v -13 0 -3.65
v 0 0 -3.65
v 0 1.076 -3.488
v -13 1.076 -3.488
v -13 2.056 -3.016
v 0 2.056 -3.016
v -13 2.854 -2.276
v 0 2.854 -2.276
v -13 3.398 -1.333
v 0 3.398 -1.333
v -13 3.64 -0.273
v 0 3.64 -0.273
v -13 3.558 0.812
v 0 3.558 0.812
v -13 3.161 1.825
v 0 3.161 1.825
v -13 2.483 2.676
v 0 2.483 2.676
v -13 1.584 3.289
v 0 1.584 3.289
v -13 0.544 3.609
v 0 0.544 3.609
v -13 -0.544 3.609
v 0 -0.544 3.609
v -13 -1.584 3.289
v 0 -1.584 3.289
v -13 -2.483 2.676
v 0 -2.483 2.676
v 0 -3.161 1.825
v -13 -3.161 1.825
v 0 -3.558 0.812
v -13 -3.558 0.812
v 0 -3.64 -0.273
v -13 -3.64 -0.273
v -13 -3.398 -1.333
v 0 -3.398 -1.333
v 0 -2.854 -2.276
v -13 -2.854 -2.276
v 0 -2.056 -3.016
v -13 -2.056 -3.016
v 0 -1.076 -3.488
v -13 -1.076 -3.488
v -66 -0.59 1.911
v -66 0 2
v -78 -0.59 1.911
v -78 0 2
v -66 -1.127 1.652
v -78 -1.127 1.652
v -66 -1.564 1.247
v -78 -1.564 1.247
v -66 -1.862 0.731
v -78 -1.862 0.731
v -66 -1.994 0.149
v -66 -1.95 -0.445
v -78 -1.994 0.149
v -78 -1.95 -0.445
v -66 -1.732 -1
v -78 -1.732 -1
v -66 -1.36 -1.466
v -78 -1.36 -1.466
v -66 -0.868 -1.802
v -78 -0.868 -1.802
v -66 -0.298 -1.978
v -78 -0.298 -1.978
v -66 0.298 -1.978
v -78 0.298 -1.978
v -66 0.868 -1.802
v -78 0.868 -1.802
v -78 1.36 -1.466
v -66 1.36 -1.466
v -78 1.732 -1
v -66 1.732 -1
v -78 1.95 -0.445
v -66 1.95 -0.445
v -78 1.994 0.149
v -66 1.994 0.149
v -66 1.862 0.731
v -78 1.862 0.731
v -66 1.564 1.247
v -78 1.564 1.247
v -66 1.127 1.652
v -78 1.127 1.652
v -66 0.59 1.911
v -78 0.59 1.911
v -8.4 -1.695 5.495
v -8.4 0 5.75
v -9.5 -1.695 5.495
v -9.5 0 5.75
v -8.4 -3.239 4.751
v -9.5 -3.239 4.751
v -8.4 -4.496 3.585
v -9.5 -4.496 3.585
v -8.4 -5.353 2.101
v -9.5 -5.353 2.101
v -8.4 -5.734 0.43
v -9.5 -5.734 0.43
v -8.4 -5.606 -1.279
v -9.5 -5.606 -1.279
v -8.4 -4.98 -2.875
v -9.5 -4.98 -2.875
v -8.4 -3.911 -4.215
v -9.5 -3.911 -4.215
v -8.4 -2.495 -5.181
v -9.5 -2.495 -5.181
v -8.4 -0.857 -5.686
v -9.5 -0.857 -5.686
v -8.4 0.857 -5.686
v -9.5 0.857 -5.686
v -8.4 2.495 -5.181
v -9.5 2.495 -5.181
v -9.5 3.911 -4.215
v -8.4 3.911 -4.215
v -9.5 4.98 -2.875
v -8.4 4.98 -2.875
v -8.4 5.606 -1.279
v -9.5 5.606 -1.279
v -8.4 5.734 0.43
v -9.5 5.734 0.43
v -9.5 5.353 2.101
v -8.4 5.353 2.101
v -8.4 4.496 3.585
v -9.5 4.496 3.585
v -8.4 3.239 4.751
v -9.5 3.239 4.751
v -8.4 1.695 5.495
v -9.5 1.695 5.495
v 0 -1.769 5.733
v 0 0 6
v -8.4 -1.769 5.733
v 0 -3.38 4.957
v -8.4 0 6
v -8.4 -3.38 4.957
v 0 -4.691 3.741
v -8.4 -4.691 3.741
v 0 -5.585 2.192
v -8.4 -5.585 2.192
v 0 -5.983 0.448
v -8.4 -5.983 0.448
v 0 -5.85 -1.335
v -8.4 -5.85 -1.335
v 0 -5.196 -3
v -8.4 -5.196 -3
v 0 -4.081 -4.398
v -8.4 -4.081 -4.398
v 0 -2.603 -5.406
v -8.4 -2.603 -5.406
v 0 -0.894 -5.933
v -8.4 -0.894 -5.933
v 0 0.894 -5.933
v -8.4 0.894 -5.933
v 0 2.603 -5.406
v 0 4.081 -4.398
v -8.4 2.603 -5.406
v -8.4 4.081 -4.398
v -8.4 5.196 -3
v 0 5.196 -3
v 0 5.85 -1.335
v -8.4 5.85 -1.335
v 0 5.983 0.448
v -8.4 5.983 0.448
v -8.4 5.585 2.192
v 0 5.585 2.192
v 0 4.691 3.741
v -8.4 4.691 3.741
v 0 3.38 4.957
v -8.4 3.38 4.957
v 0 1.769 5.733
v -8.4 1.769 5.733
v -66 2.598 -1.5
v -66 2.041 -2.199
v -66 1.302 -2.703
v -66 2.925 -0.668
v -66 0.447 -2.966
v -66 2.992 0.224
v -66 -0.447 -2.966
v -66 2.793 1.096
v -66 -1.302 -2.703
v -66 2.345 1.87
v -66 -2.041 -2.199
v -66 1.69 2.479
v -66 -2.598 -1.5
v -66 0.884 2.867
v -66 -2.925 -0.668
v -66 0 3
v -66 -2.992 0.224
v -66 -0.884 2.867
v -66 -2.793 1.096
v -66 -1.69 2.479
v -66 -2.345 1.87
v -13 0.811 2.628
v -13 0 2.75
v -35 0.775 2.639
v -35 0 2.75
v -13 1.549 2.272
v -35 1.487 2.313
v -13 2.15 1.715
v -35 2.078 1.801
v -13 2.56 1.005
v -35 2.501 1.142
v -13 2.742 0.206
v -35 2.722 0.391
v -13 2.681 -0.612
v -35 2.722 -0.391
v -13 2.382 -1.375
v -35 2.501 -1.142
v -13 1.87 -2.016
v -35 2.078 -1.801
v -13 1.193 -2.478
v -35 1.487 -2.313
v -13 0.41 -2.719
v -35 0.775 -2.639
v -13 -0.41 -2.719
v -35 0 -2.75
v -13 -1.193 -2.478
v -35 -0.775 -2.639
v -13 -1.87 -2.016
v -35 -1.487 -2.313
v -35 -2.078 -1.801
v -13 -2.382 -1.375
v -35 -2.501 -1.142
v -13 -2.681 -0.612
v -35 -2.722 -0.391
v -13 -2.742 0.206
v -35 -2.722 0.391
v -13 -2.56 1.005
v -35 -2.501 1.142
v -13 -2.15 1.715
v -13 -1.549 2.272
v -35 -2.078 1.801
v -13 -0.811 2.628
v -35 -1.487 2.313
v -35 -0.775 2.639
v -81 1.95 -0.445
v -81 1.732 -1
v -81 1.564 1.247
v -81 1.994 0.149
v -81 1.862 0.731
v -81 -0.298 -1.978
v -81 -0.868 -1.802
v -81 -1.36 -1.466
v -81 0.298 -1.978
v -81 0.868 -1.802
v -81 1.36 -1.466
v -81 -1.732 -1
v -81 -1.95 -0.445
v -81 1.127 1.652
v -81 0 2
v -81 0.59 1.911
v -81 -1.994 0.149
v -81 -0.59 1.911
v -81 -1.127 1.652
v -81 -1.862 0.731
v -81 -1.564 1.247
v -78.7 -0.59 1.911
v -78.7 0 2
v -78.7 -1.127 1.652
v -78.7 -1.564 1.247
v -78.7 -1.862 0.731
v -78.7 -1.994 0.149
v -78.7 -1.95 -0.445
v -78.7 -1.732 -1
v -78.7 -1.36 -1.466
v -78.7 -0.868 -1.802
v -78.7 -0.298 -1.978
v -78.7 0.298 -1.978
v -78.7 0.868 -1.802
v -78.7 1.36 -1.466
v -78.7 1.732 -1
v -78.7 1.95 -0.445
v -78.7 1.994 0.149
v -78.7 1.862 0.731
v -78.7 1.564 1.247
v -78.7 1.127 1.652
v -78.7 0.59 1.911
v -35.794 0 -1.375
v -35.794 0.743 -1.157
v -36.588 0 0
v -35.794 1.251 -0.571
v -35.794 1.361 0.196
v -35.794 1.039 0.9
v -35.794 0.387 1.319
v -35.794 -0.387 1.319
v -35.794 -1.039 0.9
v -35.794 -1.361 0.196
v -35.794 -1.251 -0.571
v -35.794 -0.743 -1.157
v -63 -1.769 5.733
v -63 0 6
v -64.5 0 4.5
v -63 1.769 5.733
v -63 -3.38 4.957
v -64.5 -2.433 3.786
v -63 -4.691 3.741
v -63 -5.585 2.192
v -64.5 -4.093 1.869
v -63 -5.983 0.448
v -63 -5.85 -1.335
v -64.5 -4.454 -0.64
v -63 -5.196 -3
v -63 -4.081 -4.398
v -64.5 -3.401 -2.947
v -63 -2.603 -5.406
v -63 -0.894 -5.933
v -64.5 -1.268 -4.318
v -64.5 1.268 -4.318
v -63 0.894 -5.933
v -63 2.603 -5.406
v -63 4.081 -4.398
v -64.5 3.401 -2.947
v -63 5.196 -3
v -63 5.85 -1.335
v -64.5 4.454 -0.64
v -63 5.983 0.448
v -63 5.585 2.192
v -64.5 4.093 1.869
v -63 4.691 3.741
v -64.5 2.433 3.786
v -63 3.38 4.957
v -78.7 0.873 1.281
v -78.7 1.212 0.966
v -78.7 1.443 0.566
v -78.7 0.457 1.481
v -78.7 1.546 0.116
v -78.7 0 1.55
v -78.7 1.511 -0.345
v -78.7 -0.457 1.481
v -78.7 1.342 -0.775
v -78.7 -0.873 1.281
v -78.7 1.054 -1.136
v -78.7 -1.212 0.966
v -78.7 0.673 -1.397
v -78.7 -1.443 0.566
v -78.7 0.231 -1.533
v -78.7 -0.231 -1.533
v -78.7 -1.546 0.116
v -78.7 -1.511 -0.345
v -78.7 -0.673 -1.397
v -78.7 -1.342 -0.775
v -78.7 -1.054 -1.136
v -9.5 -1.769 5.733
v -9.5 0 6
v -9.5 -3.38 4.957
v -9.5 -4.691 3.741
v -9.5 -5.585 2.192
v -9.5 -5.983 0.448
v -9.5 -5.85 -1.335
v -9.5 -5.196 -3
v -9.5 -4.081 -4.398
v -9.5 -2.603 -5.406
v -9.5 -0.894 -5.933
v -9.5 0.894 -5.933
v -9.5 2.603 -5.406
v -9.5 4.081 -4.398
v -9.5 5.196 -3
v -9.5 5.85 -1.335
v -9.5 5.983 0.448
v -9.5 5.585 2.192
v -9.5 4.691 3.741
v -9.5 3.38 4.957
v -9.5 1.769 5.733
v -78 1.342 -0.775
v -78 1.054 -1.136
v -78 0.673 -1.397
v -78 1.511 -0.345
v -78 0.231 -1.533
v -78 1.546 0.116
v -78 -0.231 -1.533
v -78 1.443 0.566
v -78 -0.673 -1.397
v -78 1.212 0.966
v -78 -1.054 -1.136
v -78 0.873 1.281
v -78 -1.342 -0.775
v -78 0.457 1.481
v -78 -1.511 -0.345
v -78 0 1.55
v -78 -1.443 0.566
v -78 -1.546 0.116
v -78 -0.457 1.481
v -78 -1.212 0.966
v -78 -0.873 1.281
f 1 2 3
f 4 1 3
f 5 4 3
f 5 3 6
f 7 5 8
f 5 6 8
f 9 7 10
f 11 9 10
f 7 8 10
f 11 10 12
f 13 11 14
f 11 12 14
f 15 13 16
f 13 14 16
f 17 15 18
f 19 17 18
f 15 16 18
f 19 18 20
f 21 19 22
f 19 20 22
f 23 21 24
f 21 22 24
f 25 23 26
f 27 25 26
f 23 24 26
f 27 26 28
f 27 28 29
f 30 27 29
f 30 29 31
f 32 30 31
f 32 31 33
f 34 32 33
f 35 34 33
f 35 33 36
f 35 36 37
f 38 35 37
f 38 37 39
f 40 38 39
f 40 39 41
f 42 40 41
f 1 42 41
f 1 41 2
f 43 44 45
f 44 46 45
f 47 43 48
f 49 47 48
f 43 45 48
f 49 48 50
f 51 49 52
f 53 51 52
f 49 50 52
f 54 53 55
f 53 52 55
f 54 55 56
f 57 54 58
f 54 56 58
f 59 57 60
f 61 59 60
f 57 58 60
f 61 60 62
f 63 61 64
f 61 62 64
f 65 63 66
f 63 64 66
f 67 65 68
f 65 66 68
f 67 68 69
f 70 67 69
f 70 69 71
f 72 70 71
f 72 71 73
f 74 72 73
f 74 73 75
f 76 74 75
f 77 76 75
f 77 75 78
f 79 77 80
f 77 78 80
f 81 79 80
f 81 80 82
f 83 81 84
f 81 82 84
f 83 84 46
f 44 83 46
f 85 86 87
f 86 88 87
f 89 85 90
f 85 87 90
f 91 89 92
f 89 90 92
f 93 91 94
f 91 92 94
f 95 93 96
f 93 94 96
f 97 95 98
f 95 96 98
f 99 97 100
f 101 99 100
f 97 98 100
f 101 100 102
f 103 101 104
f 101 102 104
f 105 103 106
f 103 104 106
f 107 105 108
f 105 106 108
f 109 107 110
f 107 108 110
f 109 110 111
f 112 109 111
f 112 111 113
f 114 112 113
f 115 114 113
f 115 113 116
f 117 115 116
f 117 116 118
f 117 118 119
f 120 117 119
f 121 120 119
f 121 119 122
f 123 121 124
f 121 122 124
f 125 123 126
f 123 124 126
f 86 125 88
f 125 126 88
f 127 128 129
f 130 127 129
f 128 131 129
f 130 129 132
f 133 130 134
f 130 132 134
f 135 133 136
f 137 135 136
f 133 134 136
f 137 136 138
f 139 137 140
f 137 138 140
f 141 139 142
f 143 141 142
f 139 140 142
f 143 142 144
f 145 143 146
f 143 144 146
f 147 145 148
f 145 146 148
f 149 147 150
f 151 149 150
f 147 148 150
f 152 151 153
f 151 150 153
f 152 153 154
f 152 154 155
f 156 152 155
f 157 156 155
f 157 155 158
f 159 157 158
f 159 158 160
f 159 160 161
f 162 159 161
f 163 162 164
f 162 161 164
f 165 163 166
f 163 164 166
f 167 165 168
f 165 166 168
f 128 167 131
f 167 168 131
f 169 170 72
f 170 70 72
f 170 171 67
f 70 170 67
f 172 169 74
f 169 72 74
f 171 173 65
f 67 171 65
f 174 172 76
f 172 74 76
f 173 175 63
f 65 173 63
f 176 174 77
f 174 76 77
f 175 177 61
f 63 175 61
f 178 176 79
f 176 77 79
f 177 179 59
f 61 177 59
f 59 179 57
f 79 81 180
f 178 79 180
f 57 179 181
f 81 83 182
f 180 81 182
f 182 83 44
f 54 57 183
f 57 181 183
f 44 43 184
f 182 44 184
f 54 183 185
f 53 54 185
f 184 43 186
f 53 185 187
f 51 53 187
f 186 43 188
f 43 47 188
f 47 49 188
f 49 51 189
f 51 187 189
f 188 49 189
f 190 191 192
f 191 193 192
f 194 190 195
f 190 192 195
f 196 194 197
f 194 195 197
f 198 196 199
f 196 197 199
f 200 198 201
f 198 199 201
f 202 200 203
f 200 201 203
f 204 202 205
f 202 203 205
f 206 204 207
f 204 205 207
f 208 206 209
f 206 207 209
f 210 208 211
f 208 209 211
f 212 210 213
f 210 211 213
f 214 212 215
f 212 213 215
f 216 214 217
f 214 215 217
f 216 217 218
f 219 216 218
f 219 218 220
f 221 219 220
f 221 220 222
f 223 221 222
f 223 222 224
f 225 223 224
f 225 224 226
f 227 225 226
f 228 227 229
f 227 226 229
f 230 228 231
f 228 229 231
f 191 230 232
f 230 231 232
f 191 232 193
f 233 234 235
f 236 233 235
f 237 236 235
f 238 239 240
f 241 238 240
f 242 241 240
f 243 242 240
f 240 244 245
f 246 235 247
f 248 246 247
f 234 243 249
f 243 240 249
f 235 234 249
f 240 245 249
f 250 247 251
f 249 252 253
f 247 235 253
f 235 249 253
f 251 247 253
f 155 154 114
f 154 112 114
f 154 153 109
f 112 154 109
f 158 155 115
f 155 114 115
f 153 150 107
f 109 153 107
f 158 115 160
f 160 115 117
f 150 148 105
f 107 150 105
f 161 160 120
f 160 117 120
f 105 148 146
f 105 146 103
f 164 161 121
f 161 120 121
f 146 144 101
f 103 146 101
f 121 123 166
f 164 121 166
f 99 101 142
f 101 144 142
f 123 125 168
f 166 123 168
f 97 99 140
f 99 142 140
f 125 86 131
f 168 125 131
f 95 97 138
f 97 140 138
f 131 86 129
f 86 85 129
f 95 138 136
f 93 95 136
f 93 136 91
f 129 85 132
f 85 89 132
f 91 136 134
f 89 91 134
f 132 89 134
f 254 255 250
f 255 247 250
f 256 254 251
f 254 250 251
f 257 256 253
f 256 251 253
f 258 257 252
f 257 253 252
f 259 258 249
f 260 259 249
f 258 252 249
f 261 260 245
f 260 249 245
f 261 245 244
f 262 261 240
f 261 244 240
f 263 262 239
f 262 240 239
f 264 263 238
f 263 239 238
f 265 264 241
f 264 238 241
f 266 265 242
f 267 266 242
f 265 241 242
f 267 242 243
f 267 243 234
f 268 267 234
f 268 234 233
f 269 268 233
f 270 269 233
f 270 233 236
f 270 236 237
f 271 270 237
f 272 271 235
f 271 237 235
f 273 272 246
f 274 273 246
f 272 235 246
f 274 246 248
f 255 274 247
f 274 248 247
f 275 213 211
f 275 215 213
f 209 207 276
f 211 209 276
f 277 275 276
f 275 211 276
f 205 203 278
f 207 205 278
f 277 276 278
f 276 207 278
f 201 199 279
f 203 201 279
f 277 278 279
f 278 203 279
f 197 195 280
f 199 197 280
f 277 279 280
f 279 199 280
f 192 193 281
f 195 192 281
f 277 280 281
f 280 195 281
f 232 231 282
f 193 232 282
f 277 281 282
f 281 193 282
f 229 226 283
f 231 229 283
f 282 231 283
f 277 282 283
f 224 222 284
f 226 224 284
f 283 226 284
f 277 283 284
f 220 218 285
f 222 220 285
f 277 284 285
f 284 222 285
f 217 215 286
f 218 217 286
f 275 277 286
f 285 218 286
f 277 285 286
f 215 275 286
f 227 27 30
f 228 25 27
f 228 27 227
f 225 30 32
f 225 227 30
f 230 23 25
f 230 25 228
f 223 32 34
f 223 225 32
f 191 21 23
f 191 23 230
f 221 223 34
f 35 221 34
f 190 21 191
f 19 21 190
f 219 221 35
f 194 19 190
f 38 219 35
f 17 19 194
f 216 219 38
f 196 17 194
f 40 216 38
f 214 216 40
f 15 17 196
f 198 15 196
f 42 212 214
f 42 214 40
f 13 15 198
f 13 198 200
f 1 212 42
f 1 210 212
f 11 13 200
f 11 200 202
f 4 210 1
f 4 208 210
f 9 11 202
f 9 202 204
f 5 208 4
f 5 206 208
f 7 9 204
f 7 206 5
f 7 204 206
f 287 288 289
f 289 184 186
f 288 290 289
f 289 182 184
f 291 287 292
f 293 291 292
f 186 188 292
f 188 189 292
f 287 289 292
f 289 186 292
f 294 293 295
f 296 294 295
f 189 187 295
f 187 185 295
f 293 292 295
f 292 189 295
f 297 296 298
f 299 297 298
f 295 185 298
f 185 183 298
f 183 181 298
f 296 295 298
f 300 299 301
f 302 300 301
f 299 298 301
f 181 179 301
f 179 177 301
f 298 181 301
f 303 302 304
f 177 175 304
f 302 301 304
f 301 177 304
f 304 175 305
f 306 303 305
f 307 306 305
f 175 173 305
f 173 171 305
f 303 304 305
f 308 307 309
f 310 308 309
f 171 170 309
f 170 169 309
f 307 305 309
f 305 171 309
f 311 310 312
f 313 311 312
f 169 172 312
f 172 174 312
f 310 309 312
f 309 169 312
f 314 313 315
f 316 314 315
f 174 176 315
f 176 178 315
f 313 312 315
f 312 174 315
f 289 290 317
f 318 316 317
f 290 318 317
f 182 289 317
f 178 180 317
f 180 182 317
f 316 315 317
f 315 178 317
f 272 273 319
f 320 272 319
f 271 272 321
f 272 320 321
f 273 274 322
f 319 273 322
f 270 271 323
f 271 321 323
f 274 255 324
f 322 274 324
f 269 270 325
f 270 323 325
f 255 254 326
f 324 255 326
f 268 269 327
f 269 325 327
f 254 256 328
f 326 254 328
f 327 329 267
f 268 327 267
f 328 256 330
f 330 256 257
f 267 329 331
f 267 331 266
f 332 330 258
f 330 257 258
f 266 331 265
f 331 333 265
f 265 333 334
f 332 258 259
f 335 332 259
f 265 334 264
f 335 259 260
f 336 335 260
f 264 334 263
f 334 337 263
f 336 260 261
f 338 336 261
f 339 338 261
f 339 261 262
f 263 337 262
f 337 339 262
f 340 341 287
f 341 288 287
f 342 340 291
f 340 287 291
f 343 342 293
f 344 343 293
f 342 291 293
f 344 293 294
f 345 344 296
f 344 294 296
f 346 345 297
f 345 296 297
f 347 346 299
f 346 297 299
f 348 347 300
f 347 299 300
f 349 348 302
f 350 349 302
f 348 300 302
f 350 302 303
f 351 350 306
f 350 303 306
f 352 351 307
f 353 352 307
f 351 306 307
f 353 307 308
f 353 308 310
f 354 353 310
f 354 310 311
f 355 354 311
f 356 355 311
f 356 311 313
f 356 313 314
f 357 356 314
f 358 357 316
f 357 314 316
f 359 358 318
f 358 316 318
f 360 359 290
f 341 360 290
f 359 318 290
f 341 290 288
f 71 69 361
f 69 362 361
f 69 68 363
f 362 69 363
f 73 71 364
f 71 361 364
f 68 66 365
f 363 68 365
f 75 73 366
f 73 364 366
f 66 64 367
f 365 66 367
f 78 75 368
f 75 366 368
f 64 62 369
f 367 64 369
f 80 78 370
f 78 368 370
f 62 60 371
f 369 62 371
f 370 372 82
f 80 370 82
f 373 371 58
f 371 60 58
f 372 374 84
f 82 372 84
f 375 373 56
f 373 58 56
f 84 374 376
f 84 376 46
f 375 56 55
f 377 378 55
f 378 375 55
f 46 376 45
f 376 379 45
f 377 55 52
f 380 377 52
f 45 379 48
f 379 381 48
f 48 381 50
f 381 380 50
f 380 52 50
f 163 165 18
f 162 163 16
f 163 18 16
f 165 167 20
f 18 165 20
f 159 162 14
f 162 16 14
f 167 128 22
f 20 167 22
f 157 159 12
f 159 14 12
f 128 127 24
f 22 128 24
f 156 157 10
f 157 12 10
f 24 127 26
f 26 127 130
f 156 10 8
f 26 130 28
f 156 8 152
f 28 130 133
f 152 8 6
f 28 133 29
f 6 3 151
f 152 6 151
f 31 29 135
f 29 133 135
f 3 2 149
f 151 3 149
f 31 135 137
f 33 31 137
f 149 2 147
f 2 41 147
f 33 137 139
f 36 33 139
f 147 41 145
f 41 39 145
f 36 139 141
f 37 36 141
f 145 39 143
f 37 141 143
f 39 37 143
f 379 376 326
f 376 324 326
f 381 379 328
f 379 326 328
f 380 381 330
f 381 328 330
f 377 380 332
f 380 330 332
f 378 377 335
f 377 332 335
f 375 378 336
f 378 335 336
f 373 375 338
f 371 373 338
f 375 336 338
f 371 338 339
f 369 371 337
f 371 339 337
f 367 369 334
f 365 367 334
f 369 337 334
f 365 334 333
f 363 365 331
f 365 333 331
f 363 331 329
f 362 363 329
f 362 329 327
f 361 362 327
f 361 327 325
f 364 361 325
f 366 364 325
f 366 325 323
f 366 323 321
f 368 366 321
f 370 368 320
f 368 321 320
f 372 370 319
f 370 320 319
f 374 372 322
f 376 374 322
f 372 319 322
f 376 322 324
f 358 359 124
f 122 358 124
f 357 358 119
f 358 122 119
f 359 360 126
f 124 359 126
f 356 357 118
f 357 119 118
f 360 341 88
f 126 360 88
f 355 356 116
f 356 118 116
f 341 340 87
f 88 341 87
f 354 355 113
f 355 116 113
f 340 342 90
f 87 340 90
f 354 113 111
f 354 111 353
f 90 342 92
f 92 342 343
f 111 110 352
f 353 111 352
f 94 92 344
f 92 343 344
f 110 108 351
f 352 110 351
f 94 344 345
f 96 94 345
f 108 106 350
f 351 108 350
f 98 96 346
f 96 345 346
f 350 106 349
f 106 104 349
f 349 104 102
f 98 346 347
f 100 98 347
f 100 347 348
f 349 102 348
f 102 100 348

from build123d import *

# Parameters (mm, degrees)
PER_AGE1_D           = 5.5
PER_AGE1_DEPTH       = 35
PER_AGE1_CBORE_D     = 7.3
PER_AGE1_CBORE_DEPTH = 13
PER_AGE1_TIP         = 1.58771324


with BuildPart() as part:
    # Esquisse1 → Base-Révolution (revolve)
    with BuildSketch(Plane.XY, mode=Mode.PRIVATE) as base_r_volution_sk:
        Polygon((0, 0), (0, 6), (-8.4, 6), (-8.4, 5.75), (-9.5, 5.75), (-9.5, 6), (-63, 6), (-66, 3), (-66, 2), (-78, 2), (-78, 1.55), (-78.7, 1.55), (-78.7, 2), (-81, 2), (-81, 0), align=None)
    revolve(base_r_volution_sk.sketch.rotate(Axis((-95.795789587, 0, 0), (1, 0, 0)), 90), axis=Axis((-95.795789587, 0, 0), (1, 0, 0)))

    # Perçage1
    with Locations(Plane(origin=(0, 0, 0), x_dir=(0, 0, -1), z_dir=(1, 0, 0))):
        with Locations((0, 0)):
            CounterBoreHole(PER_AGE1_D / 2, PER_AGE1_CBORE_D / 2, PER_AGE1_CBORE_DEPTH, depth=PER_AGE1_DEPTH)
            with Locations((0, 0, -(PER_AGE1_DEPTH + PER_AGE1_TIP / 2))):  # 120° drill point
                Cone(0, PER_AGE1_D / 2, PER_AGE1_TIP, mode=Mode.SUBTRACT)


solid = part.part
